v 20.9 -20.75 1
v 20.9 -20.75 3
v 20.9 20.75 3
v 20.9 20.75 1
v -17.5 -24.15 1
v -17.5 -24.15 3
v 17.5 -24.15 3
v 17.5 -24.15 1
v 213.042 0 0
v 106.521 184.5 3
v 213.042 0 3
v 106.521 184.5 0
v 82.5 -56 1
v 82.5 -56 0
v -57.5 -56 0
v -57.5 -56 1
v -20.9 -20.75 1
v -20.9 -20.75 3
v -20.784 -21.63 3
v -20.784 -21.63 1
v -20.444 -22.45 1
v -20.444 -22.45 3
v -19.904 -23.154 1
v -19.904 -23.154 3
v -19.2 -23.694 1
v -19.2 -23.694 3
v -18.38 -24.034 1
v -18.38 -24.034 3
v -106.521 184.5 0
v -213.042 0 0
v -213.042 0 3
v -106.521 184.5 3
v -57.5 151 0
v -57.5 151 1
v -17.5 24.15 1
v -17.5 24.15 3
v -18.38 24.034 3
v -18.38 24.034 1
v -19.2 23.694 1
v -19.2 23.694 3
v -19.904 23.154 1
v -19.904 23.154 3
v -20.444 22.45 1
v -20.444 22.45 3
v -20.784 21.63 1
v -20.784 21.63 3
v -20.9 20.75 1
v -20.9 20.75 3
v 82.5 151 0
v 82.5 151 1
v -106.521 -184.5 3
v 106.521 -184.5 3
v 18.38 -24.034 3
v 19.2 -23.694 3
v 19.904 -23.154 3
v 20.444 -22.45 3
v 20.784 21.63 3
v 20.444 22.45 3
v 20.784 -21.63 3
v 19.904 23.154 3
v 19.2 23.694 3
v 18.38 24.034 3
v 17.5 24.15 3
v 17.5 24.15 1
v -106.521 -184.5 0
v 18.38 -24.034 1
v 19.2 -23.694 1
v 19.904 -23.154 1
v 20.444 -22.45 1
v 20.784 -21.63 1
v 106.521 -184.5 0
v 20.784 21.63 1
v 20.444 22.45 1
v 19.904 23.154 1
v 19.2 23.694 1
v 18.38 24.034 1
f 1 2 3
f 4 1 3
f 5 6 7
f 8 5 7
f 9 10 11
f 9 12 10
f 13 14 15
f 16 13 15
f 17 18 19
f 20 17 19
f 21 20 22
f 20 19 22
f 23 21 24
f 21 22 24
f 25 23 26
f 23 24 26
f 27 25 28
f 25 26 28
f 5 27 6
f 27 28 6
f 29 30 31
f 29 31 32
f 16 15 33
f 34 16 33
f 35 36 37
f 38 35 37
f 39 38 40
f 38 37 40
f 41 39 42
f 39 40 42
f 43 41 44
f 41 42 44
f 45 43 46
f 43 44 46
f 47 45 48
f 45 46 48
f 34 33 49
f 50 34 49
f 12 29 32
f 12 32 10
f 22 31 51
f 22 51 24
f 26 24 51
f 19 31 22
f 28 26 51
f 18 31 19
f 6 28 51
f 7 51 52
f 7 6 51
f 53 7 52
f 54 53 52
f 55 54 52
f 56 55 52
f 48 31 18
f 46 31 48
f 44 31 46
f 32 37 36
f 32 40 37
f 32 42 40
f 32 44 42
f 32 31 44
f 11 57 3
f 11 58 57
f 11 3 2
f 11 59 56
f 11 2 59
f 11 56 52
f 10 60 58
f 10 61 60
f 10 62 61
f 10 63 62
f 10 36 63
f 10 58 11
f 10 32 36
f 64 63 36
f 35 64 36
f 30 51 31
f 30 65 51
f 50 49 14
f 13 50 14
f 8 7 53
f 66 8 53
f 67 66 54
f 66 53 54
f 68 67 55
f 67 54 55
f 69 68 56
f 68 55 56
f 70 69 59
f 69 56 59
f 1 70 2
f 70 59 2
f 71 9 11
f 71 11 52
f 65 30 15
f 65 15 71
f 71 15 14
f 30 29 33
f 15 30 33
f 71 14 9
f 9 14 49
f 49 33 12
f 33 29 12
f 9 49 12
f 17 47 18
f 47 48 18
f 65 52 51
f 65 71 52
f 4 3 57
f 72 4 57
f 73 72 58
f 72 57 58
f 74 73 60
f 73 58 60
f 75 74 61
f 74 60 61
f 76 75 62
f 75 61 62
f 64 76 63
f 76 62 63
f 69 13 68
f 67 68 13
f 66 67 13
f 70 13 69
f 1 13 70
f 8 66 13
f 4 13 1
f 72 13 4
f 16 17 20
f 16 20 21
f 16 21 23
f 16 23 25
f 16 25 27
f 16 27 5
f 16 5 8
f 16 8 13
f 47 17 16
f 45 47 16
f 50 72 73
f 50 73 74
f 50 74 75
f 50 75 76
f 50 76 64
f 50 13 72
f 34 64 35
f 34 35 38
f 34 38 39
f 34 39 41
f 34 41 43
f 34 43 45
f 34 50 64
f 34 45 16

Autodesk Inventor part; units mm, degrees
ref_plane "YZ Plane" through (0, 0, 0) normal (1, 0, 0) x (0, 1, 0)
ref_plane "XZ Plane" through (0, 0, 0) normal (0, 1, 0) x (-1, 0, 0)
ref_plane "XY Plane" through (0, 0, 0) normal (0, 0, 1) x (1, 0, 0)
sketch "Sketch1" plane through (0, 0, 0) normal (0, 0, 1) x (1, 0, 0)
  line L0 (213.0422, 0) -> (106.5211, -184.5)
  line L1 (106.5211, -184.5) -> (-106.5211, -184.5)
  line L2 (-106.5211, -184.5) -> (-213.0422, 0)
  line L3 (-213.0422, 0) -> (-106.5211, 184.5)
  line L4 (-106.5211, 184.5) -> (106.5211, 184.5)
  line L5 (106.5211, 184.5) -> (213.0422, 0)
  point P0 (0, 0)
  point P1 (0, 0)
  dimension "d0" = 369
extrude "Extrusion1" add sketch "Sketch1" along normal blind 3
sketch "Sketch3" plane through (0, 0, 3) normal (0, 0, 1) x (1, 0, 0)
  line L0 (20.9, -20.75) -> (20.9, 20.75) projected
  arc A0 (17.5, -24.15) -> (20.9, -20.75) centre (17.5, -20.75) ccw projected
  line L1 (-17.5, -24.15) -> (17.5, -24.15) projected
  arc A1 (-20.9, -20.75) -> (-17.5, -24.15) centre (-17.5, -20.75) ccw projected
  line L2 (-20.9, 20.75) -> (-20.9, -20.75) projected
  arc A2 (-17.5, 24.15) -> (-20.9, 20.75) centre (-17.5, 20.75) ccw projected
  line L3 (17.5, 24.15) -> (-17.5, 24.15) projected
  arc A3 (20.9, 20.75) -> (17.5, 24.15) centre (17.5, 20.75) ccw projected
  line L4 (213.6196, 0) -> (106.8098, -185) projected
  line L5 (106.8098, 185) -> (213.6196, 0) projected
  line L6 (-106.8098, 185) -> (106.8098, 185) projected
  line L7 (-213.6196, 0) -> (-106.8098, 185) projected
  line L8 (-106.8098, -185) -> (-213.6196, 0) projected
  line L9 (106.8098, -185) -> (-106.8098, -185) projected
  point P0 (0, 0)
extrude "Extrusion2" cut sketch "Sketch3" against normal blind 3 contours A0 L1 A1 L2 A2 L3 A3 L0
sketch "Sketch4" plane through (0, 0, 0) normal (0, 0, -1) x (-1, 0, 0)
  line L0 (49.5995, 87.1474) -> (49.5995, -46.8) projected
  line L1 (48.3995, -48) -> (-73.3995, -48) projected
  line L2 (-74.5995, -46.8) -> (-74.5995, 87.1474) projected
  arc A0 (-39.8967, 142.8769) -> (-74.5995, 87.1474) centre (-12.5, 87.1474) ccw projected
  arc A1 (49.5995, 87.1474) -> (14.8967, 142.8769) centre (-12.5, 87.1474) ccw projected
  line L3 (-82.5, -56) -> (57.5, -56)
  line L4 (57.5, -56) -> (57.5, 151)
  line L5 (57.5, 151) -> (-82.5, 151)
  line L6 (-82.5, 151) -> (-82.5, -56)
  line L7 (-39.8967, 142.8769) -> (14.8967, 142.8769)
  point P0 (0, 0)
  dimension "d5" = 140
  dimension "d6" = 207
  dimension "d8" = 57.5
  dimension "d11" = 56
extrude "Extrusion3" cut sketch "Sketch4" against normal blind 1
properties part number "AEON.AcrylicTop"
